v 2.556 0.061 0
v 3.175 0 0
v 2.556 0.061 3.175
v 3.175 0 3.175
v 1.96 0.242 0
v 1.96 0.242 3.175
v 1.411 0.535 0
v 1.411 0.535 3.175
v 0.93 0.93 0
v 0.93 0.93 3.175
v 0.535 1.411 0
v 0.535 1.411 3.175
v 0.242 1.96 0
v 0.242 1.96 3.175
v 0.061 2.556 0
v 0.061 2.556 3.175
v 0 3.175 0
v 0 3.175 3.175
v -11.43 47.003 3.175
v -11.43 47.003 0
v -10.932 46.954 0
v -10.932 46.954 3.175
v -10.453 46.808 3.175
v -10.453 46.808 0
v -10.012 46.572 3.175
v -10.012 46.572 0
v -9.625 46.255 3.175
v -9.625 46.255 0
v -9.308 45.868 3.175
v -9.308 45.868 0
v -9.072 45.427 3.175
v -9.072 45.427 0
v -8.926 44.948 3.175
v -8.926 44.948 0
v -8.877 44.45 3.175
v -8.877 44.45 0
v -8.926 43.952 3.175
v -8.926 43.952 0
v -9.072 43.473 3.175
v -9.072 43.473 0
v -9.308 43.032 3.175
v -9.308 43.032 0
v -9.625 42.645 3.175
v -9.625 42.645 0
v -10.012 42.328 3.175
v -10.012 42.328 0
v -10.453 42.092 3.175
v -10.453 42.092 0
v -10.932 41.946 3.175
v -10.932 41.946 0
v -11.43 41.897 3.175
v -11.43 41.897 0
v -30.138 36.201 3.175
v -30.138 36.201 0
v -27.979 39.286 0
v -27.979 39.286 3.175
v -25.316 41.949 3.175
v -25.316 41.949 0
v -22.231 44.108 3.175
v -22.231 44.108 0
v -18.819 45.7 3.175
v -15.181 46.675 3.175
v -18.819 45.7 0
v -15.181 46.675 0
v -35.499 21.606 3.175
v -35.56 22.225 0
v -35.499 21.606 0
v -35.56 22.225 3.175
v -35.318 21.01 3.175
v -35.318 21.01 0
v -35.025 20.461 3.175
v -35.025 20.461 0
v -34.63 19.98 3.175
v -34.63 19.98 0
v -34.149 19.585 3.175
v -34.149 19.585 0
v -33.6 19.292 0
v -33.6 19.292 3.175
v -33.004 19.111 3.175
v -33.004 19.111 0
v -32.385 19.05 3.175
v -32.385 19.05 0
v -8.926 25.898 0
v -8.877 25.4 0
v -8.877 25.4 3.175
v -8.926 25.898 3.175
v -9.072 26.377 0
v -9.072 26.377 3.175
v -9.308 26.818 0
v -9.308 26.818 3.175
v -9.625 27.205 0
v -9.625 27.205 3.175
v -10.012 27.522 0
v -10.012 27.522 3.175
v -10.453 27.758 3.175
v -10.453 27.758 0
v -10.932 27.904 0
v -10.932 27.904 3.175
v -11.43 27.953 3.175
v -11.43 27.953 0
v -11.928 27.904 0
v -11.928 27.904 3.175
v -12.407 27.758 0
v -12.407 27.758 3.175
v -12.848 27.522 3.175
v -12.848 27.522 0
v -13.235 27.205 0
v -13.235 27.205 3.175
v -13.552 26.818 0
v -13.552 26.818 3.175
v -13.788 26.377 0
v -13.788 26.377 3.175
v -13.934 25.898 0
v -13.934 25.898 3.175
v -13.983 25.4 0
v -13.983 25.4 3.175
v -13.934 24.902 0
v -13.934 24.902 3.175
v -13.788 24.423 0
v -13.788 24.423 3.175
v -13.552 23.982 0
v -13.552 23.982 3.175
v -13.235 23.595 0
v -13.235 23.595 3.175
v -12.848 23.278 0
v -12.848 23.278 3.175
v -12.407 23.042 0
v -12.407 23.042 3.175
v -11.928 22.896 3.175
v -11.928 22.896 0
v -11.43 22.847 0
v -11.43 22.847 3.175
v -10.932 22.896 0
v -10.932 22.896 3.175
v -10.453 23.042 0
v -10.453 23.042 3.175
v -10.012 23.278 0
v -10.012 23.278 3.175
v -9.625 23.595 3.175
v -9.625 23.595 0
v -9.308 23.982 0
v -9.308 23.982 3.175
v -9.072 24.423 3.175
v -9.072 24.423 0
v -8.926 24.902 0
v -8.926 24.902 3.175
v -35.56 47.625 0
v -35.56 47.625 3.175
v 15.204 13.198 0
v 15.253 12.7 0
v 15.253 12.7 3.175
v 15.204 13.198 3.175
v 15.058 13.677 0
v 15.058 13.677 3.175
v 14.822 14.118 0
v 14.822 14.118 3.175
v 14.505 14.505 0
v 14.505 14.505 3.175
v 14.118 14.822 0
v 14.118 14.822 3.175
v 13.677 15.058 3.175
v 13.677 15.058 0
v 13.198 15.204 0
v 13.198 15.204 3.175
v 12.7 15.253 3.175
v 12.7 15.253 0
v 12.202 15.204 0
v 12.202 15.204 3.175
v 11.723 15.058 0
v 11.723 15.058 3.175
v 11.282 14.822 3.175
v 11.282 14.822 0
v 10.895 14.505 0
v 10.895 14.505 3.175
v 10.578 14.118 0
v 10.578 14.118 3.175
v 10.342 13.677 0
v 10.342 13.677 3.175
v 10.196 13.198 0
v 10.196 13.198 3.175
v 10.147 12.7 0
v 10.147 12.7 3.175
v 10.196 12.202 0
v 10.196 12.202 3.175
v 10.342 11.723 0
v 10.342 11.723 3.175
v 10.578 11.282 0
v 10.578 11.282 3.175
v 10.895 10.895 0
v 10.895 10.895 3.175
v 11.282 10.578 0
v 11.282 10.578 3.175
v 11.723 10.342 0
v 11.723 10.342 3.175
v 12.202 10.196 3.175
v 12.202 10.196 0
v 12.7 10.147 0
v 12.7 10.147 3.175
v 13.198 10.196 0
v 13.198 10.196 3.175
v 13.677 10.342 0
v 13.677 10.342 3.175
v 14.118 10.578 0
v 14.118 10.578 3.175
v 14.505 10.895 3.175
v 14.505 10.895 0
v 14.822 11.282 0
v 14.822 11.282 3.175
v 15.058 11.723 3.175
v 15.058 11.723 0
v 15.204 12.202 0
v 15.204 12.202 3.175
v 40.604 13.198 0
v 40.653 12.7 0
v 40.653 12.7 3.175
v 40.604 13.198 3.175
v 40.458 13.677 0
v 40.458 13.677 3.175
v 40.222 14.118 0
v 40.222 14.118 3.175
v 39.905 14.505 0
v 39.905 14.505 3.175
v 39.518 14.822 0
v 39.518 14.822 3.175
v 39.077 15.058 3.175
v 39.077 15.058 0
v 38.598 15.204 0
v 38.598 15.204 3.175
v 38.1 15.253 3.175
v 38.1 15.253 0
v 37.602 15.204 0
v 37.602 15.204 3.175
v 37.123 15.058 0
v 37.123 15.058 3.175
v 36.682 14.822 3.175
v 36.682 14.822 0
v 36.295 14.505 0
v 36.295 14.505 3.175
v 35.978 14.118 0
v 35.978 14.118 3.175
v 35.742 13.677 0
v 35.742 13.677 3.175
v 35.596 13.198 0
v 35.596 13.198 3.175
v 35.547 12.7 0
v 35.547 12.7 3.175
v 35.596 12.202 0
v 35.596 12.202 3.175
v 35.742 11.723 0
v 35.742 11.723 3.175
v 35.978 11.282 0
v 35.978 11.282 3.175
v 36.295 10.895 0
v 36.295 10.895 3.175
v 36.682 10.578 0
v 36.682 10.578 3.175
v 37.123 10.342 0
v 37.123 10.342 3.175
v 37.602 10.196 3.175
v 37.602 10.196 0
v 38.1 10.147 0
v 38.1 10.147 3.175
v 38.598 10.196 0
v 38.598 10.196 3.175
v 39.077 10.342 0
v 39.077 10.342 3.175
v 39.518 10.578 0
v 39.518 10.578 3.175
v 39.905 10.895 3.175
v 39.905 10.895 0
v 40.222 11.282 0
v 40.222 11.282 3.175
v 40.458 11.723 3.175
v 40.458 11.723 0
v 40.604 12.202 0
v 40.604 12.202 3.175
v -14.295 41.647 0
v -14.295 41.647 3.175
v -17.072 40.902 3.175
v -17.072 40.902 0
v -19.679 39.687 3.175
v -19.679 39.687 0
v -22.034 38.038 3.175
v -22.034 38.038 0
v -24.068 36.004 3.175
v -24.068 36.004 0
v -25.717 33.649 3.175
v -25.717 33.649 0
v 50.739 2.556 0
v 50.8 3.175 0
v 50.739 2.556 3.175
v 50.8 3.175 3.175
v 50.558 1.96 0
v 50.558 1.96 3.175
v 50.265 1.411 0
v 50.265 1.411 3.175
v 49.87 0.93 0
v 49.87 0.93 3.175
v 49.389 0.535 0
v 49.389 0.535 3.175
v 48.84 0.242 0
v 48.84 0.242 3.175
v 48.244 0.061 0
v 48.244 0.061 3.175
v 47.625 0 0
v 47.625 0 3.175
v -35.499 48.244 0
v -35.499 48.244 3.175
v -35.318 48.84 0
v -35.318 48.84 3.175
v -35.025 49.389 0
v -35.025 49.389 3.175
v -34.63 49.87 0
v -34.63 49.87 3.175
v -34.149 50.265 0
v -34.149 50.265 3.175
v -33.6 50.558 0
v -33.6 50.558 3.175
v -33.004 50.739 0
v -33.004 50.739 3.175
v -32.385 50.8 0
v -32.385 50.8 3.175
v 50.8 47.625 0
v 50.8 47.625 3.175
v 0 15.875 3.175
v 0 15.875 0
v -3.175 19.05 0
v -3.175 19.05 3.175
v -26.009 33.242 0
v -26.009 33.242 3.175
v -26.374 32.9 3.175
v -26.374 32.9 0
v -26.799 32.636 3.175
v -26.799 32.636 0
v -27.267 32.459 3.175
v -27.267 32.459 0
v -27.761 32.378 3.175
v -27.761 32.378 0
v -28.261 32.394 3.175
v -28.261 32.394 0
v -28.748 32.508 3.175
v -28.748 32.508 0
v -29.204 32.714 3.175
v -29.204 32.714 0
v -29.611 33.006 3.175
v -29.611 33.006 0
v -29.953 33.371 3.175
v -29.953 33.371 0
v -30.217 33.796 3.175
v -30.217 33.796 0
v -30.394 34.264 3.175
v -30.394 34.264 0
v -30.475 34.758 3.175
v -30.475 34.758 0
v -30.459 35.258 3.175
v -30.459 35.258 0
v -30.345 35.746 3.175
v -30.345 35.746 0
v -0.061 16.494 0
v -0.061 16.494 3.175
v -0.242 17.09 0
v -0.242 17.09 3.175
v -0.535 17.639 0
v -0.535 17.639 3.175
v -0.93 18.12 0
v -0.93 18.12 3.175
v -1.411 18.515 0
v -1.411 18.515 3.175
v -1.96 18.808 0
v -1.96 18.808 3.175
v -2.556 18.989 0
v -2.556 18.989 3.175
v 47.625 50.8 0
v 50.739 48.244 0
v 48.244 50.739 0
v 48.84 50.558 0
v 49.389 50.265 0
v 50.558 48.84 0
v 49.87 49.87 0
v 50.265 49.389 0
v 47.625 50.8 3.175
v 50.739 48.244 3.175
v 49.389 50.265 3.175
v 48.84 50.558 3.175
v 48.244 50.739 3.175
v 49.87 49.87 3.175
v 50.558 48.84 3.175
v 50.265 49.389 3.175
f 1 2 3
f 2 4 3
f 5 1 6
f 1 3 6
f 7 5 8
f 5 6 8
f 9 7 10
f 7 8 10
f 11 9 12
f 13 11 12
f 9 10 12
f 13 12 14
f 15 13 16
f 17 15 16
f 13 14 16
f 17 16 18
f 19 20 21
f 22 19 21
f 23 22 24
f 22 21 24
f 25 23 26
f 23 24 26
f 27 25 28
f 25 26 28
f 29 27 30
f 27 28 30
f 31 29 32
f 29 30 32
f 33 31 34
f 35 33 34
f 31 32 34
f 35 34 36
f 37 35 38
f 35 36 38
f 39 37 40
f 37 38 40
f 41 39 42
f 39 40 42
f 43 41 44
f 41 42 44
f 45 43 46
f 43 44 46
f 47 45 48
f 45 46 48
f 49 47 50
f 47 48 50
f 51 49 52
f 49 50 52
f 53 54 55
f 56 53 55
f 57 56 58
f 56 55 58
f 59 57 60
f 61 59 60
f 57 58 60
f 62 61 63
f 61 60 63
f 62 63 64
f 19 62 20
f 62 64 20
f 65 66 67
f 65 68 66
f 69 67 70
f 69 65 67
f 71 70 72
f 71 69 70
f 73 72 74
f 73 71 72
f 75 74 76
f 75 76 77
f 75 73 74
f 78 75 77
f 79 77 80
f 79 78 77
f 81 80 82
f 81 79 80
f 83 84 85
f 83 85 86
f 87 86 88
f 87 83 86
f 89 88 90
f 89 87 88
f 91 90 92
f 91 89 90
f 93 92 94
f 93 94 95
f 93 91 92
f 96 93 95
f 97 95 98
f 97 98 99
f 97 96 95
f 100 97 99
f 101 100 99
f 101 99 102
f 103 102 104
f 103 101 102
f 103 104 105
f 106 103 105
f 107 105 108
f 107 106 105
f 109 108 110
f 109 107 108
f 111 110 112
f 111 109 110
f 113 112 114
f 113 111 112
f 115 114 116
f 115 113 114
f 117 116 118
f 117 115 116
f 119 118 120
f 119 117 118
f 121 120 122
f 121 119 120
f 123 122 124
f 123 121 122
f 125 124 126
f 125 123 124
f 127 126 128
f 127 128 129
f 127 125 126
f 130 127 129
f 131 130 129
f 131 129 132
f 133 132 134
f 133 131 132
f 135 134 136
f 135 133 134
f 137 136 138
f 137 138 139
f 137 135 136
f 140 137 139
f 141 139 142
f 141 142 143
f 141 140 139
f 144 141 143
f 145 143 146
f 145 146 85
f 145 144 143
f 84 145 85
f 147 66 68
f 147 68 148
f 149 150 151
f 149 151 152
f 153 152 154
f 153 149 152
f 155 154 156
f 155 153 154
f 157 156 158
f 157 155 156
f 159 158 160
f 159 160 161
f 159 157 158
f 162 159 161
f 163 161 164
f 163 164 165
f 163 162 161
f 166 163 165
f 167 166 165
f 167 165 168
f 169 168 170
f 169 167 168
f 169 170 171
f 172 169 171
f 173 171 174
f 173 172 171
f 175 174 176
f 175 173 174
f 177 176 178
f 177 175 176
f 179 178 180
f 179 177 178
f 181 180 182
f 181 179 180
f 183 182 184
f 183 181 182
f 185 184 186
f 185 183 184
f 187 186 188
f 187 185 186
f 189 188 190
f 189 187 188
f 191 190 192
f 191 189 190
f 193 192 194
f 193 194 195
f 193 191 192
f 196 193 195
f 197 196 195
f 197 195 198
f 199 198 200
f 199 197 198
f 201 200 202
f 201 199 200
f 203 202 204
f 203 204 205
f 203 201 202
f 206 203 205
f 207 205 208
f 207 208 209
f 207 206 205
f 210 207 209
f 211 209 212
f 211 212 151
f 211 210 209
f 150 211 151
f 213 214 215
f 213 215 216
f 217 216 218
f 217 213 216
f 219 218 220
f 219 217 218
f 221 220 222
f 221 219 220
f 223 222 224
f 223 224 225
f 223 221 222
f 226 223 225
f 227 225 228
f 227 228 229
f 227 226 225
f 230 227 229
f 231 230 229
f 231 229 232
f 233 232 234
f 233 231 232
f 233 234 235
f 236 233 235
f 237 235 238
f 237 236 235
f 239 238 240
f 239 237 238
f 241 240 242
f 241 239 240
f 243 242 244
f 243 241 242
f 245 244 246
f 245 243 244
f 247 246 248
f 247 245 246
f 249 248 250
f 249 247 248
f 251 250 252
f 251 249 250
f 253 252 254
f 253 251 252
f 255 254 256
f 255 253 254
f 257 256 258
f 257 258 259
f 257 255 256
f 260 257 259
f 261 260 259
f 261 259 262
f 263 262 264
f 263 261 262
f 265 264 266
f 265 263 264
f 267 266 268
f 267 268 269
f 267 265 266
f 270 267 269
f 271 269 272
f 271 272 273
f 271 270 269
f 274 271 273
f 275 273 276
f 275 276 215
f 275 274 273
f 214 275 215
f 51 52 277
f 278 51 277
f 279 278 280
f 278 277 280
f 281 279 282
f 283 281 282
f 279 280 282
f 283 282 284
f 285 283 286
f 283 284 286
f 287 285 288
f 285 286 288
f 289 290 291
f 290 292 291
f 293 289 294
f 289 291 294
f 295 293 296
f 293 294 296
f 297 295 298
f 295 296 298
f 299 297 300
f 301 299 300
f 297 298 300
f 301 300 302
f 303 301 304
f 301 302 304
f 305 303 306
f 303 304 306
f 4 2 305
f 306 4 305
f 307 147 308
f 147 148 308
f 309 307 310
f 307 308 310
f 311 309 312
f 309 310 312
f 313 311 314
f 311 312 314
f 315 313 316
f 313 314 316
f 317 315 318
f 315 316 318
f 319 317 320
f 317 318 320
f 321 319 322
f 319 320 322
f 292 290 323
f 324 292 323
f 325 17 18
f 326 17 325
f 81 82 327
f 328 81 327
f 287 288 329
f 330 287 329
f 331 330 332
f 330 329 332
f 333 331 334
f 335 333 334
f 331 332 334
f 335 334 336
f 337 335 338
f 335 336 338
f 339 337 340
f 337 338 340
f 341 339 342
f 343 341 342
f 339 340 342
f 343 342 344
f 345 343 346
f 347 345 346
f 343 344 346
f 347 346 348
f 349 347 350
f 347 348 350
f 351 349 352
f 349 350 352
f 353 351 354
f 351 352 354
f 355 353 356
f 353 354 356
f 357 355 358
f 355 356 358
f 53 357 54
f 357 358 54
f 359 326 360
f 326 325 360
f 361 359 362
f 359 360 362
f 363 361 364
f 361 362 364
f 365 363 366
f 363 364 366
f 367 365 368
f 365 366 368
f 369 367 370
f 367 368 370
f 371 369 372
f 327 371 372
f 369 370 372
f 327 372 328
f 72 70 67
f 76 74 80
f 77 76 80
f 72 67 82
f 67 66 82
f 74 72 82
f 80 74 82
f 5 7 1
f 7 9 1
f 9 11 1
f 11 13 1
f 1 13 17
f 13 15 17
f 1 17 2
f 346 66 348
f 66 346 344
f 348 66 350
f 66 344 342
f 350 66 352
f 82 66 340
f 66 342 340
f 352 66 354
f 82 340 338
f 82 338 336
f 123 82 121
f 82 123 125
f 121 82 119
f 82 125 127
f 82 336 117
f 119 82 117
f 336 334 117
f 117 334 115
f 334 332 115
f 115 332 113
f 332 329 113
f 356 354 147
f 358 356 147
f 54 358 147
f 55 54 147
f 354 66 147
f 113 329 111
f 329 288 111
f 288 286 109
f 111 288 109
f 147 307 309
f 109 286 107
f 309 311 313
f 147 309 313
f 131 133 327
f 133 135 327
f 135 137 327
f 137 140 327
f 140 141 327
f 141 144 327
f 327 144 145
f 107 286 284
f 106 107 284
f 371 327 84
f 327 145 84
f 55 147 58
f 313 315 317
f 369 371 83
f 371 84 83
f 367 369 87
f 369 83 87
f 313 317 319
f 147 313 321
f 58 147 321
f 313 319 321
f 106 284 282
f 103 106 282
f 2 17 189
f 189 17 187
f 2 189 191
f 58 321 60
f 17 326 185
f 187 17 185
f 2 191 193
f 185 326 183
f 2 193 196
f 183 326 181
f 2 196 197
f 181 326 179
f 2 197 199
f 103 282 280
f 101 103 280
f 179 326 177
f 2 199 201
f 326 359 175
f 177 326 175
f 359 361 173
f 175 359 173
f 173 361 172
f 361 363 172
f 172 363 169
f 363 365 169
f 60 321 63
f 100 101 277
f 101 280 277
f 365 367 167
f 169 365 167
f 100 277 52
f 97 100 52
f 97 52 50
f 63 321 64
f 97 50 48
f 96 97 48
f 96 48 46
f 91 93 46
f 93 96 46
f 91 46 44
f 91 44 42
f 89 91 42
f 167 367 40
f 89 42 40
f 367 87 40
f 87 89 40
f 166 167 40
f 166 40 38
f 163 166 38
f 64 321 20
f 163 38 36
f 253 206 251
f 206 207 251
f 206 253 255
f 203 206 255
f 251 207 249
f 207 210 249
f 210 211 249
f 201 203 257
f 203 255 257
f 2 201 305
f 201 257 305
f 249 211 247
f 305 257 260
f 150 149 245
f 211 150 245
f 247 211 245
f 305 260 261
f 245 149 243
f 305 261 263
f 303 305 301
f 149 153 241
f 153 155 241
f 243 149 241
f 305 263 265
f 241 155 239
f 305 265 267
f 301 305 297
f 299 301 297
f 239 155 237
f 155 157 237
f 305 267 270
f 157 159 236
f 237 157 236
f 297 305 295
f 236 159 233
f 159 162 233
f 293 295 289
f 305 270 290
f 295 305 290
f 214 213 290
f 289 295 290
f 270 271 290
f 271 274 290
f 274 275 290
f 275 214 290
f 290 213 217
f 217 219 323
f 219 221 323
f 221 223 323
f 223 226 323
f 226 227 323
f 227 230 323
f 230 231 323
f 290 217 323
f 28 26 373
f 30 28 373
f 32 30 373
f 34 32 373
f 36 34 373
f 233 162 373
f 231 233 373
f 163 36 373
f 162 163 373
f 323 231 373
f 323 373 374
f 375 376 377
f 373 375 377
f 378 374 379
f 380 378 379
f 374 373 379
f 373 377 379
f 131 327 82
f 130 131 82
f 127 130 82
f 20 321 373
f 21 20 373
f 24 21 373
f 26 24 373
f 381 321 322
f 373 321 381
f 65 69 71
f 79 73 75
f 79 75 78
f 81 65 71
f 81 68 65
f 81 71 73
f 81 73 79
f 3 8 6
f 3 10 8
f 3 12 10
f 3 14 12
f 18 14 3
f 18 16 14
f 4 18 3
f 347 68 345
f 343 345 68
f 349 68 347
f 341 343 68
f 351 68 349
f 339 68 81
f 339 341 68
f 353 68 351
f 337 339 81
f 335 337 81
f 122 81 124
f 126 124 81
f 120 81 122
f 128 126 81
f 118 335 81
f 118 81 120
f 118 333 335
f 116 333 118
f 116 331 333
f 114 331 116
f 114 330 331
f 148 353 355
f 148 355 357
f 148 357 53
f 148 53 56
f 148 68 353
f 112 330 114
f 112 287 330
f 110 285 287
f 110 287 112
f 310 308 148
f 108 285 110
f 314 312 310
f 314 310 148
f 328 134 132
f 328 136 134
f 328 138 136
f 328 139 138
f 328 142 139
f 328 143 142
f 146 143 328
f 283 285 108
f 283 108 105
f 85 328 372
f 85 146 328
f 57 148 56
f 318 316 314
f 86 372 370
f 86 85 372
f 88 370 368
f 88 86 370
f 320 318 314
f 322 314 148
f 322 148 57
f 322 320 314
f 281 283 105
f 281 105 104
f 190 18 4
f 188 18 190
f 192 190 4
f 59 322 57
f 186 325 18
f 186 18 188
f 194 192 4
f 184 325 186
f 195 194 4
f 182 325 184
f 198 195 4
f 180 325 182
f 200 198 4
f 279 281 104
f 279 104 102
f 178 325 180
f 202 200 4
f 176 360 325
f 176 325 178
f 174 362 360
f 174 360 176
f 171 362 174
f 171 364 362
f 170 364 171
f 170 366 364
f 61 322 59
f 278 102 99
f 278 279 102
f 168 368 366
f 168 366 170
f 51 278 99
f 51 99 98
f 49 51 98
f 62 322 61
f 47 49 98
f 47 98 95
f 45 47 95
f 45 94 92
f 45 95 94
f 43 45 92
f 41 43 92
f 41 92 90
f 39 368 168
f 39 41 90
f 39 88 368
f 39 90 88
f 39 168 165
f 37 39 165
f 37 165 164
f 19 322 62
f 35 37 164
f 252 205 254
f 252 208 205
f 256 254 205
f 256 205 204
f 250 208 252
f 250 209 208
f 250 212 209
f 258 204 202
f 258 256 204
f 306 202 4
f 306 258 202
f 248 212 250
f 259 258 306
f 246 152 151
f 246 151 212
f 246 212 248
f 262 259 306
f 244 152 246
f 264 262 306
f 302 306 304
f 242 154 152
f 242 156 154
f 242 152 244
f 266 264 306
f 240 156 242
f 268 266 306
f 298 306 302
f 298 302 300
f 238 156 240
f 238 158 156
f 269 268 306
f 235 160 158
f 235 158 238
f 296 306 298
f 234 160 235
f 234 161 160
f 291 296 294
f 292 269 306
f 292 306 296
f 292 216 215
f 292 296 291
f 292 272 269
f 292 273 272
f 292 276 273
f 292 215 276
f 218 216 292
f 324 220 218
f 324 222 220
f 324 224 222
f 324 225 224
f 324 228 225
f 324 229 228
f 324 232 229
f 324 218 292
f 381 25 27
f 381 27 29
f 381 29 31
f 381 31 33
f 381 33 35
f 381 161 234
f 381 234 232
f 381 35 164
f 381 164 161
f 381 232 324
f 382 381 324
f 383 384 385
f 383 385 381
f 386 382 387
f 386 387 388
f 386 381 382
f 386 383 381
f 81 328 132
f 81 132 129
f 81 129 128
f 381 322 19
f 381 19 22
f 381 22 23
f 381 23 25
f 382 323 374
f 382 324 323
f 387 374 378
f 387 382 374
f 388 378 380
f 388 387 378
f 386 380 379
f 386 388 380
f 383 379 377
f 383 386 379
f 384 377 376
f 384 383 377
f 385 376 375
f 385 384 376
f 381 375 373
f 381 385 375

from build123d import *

# Parameters (mm, degrees)
SKETCH1_W           = 50.8
SKETCH1_H           = 50.8
SKETCH1_R           = 2.5527
SKETCH1_W_2         = 35.56
SKETCH1_H_2         = 31.75
BOSS_EXTRUDE1_DEPTH = 3.175
FILLET1_R           = 3.175


with BuildPart() as part:
    # Sketch1 → Boss-Extrude1 (new body)
    # profile 1 of 2: a face of its own
    with BuildSketch(Plane.XY):
        with Locations((25.4, 25.4)):
            Rectangle(SKETCH1_W, SKETCH1_H)
        with Locations((38.1, 12.7)):
            Circle(SKETCH1_R, mode=Mode.SUBTRACT)
        with Locations((12.7, 12.7)):
            Circle(SKETCH1_R, mode=Mode.SUBTRACT)
    # profile 2 of 2: a face of its own
    with BuildSketch(Plane.XY):
        with Locations((-17.78, 34.925)):
            Rectangle(SKETCH1_W_2, SKETCH1_H_2)
        with Locations((-11.43, 25.4)):
            Circle(SKETCH1_R, mode=Mode.SUBTRACT)
        with BuildLine():
            ThreePointArc((-25.717080894, 33.64865), (-29.204133942, 32.714296952), (-30.13848699, 36.20135))
            ThreePointArc((-30.13848699, 36.20135), (-22.23135, 44.10848699), (-11.43, 47.0027))
            ThreePointArc((-11.43, 47.0027), (-8.8773, 44.45), (-11.43, 41.8973))
            ThreePointArc((-11.43, 41.8973), (-19.67865, 39.687080894), (-25.717080894, 33.64865))
        make_face(mode=Mode.SUBTRACT)
    extrude(amount=BOSS_EXTRUDE1_DEPTH)

    # Fillet1
    fillet1_edges = [part.edges().sort_by_distance(p)[0] for p in [
        (0, 0, 1.5875),
        (0, 19.05, 1.5875),
        (-35.56, 19.05, 1.5875),
        (-35.56, 50.8, 1.5875),
        (50.8, 50.8, 1.5875),
        (50.8, 0, 1.5875),
    ]]
    fillet(fillet1_edges, radius=FILLET1_R)


solid = part.part
